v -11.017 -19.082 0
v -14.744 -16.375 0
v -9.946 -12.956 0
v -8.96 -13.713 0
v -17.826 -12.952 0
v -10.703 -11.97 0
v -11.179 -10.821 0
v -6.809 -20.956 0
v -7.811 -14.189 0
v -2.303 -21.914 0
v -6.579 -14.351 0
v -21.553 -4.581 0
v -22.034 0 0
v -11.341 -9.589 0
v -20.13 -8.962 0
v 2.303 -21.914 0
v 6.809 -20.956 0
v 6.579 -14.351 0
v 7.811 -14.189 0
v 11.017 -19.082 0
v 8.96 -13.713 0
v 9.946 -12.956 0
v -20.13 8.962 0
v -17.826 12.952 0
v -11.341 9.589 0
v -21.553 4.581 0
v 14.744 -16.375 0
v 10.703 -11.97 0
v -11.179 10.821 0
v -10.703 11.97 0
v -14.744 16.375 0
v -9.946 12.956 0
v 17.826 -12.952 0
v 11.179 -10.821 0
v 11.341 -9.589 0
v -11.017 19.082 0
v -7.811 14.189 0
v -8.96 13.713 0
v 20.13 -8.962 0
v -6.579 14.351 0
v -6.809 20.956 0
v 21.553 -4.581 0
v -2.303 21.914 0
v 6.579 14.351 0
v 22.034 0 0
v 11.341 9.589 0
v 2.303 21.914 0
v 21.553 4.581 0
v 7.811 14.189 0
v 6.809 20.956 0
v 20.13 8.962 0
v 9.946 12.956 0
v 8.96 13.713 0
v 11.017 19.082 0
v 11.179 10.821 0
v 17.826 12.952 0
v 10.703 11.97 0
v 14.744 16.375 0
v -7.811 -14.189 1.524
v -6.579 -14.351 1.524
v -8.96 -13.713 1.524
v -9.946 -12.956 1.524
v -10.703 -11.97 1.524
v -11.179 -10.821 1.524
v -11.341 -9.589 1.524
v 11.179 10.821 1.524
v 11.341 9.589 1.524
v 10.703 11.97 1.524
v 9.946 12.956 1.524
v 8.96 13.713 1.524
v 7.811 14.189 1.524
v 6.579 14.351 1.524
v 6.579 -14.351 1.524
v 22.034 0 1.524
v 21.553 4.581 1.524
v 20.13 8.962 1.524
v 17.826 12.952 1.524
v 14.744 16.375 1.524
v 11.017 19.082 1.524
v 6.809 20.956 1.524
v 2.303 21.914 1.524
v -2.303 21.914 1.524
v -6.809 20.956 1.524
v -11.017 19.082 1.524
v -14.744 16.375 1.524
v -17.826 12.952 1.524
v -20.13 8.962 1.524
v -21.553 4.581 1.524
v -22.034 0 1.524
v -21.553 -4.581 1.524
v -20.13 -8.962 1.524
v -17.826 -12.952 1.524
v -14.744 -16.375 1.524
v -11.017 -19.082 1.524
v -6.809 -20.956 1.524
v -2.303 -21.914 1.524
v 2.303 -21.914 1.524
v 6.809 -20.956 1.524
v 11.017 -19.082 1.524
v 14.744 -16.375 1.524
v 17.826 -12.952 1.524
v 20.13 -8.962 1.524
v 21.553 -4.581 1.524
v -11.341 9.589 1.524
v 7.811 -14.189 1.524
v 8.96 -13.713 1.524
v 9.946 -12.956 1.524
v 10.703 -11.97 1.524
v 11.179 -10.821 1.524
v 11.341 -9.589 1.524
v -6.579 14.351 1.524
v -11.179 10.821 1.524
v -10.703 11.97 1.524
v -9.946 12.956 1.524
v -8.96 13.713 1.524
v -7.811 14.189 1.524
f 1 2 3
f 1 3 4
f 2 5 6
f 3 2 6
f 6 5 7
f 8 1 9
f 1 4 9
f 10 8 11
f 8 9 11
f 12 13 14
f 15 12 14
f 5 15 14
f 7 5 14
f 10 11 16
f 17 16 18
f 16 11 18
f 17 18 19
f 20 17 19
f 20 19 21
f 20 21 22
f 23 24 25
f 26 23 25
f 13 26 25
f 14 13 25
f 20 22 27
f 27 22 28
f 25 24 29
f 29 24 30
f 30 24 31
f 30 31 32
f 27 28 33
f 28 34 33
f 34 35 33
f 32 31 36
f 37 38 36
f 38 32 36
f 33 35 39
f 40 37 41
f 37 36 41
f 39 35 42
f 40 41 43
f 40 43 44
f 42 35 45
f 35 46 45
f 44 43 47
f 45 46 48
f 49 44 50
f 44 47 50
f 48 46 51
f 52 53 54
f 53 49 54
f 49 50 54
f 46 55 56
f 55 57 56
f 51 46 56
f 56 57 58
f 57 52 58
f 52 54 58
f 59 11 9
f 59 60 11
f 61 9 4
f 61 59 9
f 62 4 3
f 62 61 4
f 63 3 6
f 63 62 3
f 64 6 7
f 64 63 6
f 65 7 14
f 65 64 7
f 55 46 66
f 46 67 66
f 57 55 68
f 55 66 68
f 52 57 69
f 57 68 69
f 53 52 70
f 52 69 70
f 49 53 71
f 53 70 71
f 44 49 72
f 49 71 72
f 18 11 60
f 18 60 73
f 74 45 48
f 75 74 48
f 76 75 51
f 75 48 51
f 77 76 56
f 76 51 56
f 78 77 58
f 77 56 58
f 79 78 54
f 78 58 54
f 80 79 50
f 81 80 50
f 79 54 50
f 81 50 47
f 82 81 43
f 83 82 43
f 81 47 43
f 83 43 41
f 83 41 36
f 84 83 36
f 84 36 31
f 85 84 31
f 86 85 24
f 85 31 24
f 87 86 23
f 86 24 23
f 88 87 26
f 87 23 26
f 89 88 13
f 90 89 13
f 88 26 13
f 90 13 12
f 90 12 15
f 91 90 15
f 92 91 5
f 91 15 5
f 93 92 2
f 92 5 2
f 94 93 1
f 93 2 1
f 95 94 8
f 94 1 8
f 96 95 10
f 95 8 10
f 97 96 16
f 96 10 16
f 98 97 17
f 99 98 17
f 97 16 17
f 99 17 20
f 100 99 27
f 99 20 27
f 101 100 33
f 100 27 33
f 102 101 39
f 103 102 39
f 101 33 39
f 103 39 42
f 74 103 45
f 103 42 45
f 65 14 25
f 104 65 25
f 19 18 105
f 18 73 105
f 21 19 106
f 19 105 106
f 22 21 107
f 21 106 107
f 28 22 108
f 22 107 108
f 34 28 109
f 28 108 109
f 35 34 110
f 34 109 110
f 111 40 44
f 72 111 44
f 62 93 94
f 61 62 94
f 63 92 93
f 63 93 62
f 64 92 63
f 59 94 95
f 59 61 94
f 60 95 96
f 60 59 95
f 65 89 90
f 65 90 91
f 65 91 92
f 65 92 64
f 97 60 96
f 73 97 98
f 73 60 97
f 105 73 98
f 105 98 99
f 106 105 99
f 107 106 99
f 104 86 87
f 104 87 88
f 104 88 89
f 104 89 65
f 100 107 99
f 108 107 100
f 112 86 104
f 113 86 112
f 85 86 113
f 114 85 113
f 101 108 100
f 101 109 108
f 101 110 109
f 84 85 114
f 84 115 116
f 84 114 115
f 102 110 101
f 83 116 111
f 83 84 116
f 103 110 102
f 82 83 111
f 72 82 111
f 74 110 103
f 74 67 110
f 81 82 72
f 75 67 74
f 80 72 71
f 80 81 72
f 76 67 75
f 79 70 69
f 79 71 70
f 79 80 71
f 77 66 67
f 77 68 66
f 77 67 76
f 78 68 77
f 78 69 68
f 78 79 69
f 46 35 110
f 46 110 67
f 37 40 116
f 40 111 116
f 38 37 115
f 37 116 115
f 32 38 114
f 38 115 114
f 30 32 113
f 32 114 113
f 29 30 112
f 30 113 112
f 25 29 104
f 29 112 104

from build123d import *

# Parameters (mm, degrees)
SKETCH1_R      = 22.0345
SKETCH1_W      = 22.6822
SKETCH1_H      = 28.702
EXTRUDE1_DEPTH = 1.524
FILLET1_R      = 4.7625


with BuildPart() as part:
    # Sketch1 → Extrude1 (new body)
    with BuildSketch(Plane.XY):
        Circle(SKETCH1_R)
        Rectangle(SKETCH1_W, SKETCH1_H, mode=Mode.SUBTRACT)
    extrude(amount=EXTRUDE1_DEPTH)

    # Fillet1
    fillet1_edges = [part.edges().sort_by_distance(p)[0] for p in [
        (-11.3411, 14.351, 0.762),
        (-11.3411, -14.351, 0.762),
        (11.3411, -14.351, 0.762),
        (11.3411, 14.351, 0.762),
    ]]
    fillet(fillet1_edges, radius=FILLET1_R)


solid = part.part
